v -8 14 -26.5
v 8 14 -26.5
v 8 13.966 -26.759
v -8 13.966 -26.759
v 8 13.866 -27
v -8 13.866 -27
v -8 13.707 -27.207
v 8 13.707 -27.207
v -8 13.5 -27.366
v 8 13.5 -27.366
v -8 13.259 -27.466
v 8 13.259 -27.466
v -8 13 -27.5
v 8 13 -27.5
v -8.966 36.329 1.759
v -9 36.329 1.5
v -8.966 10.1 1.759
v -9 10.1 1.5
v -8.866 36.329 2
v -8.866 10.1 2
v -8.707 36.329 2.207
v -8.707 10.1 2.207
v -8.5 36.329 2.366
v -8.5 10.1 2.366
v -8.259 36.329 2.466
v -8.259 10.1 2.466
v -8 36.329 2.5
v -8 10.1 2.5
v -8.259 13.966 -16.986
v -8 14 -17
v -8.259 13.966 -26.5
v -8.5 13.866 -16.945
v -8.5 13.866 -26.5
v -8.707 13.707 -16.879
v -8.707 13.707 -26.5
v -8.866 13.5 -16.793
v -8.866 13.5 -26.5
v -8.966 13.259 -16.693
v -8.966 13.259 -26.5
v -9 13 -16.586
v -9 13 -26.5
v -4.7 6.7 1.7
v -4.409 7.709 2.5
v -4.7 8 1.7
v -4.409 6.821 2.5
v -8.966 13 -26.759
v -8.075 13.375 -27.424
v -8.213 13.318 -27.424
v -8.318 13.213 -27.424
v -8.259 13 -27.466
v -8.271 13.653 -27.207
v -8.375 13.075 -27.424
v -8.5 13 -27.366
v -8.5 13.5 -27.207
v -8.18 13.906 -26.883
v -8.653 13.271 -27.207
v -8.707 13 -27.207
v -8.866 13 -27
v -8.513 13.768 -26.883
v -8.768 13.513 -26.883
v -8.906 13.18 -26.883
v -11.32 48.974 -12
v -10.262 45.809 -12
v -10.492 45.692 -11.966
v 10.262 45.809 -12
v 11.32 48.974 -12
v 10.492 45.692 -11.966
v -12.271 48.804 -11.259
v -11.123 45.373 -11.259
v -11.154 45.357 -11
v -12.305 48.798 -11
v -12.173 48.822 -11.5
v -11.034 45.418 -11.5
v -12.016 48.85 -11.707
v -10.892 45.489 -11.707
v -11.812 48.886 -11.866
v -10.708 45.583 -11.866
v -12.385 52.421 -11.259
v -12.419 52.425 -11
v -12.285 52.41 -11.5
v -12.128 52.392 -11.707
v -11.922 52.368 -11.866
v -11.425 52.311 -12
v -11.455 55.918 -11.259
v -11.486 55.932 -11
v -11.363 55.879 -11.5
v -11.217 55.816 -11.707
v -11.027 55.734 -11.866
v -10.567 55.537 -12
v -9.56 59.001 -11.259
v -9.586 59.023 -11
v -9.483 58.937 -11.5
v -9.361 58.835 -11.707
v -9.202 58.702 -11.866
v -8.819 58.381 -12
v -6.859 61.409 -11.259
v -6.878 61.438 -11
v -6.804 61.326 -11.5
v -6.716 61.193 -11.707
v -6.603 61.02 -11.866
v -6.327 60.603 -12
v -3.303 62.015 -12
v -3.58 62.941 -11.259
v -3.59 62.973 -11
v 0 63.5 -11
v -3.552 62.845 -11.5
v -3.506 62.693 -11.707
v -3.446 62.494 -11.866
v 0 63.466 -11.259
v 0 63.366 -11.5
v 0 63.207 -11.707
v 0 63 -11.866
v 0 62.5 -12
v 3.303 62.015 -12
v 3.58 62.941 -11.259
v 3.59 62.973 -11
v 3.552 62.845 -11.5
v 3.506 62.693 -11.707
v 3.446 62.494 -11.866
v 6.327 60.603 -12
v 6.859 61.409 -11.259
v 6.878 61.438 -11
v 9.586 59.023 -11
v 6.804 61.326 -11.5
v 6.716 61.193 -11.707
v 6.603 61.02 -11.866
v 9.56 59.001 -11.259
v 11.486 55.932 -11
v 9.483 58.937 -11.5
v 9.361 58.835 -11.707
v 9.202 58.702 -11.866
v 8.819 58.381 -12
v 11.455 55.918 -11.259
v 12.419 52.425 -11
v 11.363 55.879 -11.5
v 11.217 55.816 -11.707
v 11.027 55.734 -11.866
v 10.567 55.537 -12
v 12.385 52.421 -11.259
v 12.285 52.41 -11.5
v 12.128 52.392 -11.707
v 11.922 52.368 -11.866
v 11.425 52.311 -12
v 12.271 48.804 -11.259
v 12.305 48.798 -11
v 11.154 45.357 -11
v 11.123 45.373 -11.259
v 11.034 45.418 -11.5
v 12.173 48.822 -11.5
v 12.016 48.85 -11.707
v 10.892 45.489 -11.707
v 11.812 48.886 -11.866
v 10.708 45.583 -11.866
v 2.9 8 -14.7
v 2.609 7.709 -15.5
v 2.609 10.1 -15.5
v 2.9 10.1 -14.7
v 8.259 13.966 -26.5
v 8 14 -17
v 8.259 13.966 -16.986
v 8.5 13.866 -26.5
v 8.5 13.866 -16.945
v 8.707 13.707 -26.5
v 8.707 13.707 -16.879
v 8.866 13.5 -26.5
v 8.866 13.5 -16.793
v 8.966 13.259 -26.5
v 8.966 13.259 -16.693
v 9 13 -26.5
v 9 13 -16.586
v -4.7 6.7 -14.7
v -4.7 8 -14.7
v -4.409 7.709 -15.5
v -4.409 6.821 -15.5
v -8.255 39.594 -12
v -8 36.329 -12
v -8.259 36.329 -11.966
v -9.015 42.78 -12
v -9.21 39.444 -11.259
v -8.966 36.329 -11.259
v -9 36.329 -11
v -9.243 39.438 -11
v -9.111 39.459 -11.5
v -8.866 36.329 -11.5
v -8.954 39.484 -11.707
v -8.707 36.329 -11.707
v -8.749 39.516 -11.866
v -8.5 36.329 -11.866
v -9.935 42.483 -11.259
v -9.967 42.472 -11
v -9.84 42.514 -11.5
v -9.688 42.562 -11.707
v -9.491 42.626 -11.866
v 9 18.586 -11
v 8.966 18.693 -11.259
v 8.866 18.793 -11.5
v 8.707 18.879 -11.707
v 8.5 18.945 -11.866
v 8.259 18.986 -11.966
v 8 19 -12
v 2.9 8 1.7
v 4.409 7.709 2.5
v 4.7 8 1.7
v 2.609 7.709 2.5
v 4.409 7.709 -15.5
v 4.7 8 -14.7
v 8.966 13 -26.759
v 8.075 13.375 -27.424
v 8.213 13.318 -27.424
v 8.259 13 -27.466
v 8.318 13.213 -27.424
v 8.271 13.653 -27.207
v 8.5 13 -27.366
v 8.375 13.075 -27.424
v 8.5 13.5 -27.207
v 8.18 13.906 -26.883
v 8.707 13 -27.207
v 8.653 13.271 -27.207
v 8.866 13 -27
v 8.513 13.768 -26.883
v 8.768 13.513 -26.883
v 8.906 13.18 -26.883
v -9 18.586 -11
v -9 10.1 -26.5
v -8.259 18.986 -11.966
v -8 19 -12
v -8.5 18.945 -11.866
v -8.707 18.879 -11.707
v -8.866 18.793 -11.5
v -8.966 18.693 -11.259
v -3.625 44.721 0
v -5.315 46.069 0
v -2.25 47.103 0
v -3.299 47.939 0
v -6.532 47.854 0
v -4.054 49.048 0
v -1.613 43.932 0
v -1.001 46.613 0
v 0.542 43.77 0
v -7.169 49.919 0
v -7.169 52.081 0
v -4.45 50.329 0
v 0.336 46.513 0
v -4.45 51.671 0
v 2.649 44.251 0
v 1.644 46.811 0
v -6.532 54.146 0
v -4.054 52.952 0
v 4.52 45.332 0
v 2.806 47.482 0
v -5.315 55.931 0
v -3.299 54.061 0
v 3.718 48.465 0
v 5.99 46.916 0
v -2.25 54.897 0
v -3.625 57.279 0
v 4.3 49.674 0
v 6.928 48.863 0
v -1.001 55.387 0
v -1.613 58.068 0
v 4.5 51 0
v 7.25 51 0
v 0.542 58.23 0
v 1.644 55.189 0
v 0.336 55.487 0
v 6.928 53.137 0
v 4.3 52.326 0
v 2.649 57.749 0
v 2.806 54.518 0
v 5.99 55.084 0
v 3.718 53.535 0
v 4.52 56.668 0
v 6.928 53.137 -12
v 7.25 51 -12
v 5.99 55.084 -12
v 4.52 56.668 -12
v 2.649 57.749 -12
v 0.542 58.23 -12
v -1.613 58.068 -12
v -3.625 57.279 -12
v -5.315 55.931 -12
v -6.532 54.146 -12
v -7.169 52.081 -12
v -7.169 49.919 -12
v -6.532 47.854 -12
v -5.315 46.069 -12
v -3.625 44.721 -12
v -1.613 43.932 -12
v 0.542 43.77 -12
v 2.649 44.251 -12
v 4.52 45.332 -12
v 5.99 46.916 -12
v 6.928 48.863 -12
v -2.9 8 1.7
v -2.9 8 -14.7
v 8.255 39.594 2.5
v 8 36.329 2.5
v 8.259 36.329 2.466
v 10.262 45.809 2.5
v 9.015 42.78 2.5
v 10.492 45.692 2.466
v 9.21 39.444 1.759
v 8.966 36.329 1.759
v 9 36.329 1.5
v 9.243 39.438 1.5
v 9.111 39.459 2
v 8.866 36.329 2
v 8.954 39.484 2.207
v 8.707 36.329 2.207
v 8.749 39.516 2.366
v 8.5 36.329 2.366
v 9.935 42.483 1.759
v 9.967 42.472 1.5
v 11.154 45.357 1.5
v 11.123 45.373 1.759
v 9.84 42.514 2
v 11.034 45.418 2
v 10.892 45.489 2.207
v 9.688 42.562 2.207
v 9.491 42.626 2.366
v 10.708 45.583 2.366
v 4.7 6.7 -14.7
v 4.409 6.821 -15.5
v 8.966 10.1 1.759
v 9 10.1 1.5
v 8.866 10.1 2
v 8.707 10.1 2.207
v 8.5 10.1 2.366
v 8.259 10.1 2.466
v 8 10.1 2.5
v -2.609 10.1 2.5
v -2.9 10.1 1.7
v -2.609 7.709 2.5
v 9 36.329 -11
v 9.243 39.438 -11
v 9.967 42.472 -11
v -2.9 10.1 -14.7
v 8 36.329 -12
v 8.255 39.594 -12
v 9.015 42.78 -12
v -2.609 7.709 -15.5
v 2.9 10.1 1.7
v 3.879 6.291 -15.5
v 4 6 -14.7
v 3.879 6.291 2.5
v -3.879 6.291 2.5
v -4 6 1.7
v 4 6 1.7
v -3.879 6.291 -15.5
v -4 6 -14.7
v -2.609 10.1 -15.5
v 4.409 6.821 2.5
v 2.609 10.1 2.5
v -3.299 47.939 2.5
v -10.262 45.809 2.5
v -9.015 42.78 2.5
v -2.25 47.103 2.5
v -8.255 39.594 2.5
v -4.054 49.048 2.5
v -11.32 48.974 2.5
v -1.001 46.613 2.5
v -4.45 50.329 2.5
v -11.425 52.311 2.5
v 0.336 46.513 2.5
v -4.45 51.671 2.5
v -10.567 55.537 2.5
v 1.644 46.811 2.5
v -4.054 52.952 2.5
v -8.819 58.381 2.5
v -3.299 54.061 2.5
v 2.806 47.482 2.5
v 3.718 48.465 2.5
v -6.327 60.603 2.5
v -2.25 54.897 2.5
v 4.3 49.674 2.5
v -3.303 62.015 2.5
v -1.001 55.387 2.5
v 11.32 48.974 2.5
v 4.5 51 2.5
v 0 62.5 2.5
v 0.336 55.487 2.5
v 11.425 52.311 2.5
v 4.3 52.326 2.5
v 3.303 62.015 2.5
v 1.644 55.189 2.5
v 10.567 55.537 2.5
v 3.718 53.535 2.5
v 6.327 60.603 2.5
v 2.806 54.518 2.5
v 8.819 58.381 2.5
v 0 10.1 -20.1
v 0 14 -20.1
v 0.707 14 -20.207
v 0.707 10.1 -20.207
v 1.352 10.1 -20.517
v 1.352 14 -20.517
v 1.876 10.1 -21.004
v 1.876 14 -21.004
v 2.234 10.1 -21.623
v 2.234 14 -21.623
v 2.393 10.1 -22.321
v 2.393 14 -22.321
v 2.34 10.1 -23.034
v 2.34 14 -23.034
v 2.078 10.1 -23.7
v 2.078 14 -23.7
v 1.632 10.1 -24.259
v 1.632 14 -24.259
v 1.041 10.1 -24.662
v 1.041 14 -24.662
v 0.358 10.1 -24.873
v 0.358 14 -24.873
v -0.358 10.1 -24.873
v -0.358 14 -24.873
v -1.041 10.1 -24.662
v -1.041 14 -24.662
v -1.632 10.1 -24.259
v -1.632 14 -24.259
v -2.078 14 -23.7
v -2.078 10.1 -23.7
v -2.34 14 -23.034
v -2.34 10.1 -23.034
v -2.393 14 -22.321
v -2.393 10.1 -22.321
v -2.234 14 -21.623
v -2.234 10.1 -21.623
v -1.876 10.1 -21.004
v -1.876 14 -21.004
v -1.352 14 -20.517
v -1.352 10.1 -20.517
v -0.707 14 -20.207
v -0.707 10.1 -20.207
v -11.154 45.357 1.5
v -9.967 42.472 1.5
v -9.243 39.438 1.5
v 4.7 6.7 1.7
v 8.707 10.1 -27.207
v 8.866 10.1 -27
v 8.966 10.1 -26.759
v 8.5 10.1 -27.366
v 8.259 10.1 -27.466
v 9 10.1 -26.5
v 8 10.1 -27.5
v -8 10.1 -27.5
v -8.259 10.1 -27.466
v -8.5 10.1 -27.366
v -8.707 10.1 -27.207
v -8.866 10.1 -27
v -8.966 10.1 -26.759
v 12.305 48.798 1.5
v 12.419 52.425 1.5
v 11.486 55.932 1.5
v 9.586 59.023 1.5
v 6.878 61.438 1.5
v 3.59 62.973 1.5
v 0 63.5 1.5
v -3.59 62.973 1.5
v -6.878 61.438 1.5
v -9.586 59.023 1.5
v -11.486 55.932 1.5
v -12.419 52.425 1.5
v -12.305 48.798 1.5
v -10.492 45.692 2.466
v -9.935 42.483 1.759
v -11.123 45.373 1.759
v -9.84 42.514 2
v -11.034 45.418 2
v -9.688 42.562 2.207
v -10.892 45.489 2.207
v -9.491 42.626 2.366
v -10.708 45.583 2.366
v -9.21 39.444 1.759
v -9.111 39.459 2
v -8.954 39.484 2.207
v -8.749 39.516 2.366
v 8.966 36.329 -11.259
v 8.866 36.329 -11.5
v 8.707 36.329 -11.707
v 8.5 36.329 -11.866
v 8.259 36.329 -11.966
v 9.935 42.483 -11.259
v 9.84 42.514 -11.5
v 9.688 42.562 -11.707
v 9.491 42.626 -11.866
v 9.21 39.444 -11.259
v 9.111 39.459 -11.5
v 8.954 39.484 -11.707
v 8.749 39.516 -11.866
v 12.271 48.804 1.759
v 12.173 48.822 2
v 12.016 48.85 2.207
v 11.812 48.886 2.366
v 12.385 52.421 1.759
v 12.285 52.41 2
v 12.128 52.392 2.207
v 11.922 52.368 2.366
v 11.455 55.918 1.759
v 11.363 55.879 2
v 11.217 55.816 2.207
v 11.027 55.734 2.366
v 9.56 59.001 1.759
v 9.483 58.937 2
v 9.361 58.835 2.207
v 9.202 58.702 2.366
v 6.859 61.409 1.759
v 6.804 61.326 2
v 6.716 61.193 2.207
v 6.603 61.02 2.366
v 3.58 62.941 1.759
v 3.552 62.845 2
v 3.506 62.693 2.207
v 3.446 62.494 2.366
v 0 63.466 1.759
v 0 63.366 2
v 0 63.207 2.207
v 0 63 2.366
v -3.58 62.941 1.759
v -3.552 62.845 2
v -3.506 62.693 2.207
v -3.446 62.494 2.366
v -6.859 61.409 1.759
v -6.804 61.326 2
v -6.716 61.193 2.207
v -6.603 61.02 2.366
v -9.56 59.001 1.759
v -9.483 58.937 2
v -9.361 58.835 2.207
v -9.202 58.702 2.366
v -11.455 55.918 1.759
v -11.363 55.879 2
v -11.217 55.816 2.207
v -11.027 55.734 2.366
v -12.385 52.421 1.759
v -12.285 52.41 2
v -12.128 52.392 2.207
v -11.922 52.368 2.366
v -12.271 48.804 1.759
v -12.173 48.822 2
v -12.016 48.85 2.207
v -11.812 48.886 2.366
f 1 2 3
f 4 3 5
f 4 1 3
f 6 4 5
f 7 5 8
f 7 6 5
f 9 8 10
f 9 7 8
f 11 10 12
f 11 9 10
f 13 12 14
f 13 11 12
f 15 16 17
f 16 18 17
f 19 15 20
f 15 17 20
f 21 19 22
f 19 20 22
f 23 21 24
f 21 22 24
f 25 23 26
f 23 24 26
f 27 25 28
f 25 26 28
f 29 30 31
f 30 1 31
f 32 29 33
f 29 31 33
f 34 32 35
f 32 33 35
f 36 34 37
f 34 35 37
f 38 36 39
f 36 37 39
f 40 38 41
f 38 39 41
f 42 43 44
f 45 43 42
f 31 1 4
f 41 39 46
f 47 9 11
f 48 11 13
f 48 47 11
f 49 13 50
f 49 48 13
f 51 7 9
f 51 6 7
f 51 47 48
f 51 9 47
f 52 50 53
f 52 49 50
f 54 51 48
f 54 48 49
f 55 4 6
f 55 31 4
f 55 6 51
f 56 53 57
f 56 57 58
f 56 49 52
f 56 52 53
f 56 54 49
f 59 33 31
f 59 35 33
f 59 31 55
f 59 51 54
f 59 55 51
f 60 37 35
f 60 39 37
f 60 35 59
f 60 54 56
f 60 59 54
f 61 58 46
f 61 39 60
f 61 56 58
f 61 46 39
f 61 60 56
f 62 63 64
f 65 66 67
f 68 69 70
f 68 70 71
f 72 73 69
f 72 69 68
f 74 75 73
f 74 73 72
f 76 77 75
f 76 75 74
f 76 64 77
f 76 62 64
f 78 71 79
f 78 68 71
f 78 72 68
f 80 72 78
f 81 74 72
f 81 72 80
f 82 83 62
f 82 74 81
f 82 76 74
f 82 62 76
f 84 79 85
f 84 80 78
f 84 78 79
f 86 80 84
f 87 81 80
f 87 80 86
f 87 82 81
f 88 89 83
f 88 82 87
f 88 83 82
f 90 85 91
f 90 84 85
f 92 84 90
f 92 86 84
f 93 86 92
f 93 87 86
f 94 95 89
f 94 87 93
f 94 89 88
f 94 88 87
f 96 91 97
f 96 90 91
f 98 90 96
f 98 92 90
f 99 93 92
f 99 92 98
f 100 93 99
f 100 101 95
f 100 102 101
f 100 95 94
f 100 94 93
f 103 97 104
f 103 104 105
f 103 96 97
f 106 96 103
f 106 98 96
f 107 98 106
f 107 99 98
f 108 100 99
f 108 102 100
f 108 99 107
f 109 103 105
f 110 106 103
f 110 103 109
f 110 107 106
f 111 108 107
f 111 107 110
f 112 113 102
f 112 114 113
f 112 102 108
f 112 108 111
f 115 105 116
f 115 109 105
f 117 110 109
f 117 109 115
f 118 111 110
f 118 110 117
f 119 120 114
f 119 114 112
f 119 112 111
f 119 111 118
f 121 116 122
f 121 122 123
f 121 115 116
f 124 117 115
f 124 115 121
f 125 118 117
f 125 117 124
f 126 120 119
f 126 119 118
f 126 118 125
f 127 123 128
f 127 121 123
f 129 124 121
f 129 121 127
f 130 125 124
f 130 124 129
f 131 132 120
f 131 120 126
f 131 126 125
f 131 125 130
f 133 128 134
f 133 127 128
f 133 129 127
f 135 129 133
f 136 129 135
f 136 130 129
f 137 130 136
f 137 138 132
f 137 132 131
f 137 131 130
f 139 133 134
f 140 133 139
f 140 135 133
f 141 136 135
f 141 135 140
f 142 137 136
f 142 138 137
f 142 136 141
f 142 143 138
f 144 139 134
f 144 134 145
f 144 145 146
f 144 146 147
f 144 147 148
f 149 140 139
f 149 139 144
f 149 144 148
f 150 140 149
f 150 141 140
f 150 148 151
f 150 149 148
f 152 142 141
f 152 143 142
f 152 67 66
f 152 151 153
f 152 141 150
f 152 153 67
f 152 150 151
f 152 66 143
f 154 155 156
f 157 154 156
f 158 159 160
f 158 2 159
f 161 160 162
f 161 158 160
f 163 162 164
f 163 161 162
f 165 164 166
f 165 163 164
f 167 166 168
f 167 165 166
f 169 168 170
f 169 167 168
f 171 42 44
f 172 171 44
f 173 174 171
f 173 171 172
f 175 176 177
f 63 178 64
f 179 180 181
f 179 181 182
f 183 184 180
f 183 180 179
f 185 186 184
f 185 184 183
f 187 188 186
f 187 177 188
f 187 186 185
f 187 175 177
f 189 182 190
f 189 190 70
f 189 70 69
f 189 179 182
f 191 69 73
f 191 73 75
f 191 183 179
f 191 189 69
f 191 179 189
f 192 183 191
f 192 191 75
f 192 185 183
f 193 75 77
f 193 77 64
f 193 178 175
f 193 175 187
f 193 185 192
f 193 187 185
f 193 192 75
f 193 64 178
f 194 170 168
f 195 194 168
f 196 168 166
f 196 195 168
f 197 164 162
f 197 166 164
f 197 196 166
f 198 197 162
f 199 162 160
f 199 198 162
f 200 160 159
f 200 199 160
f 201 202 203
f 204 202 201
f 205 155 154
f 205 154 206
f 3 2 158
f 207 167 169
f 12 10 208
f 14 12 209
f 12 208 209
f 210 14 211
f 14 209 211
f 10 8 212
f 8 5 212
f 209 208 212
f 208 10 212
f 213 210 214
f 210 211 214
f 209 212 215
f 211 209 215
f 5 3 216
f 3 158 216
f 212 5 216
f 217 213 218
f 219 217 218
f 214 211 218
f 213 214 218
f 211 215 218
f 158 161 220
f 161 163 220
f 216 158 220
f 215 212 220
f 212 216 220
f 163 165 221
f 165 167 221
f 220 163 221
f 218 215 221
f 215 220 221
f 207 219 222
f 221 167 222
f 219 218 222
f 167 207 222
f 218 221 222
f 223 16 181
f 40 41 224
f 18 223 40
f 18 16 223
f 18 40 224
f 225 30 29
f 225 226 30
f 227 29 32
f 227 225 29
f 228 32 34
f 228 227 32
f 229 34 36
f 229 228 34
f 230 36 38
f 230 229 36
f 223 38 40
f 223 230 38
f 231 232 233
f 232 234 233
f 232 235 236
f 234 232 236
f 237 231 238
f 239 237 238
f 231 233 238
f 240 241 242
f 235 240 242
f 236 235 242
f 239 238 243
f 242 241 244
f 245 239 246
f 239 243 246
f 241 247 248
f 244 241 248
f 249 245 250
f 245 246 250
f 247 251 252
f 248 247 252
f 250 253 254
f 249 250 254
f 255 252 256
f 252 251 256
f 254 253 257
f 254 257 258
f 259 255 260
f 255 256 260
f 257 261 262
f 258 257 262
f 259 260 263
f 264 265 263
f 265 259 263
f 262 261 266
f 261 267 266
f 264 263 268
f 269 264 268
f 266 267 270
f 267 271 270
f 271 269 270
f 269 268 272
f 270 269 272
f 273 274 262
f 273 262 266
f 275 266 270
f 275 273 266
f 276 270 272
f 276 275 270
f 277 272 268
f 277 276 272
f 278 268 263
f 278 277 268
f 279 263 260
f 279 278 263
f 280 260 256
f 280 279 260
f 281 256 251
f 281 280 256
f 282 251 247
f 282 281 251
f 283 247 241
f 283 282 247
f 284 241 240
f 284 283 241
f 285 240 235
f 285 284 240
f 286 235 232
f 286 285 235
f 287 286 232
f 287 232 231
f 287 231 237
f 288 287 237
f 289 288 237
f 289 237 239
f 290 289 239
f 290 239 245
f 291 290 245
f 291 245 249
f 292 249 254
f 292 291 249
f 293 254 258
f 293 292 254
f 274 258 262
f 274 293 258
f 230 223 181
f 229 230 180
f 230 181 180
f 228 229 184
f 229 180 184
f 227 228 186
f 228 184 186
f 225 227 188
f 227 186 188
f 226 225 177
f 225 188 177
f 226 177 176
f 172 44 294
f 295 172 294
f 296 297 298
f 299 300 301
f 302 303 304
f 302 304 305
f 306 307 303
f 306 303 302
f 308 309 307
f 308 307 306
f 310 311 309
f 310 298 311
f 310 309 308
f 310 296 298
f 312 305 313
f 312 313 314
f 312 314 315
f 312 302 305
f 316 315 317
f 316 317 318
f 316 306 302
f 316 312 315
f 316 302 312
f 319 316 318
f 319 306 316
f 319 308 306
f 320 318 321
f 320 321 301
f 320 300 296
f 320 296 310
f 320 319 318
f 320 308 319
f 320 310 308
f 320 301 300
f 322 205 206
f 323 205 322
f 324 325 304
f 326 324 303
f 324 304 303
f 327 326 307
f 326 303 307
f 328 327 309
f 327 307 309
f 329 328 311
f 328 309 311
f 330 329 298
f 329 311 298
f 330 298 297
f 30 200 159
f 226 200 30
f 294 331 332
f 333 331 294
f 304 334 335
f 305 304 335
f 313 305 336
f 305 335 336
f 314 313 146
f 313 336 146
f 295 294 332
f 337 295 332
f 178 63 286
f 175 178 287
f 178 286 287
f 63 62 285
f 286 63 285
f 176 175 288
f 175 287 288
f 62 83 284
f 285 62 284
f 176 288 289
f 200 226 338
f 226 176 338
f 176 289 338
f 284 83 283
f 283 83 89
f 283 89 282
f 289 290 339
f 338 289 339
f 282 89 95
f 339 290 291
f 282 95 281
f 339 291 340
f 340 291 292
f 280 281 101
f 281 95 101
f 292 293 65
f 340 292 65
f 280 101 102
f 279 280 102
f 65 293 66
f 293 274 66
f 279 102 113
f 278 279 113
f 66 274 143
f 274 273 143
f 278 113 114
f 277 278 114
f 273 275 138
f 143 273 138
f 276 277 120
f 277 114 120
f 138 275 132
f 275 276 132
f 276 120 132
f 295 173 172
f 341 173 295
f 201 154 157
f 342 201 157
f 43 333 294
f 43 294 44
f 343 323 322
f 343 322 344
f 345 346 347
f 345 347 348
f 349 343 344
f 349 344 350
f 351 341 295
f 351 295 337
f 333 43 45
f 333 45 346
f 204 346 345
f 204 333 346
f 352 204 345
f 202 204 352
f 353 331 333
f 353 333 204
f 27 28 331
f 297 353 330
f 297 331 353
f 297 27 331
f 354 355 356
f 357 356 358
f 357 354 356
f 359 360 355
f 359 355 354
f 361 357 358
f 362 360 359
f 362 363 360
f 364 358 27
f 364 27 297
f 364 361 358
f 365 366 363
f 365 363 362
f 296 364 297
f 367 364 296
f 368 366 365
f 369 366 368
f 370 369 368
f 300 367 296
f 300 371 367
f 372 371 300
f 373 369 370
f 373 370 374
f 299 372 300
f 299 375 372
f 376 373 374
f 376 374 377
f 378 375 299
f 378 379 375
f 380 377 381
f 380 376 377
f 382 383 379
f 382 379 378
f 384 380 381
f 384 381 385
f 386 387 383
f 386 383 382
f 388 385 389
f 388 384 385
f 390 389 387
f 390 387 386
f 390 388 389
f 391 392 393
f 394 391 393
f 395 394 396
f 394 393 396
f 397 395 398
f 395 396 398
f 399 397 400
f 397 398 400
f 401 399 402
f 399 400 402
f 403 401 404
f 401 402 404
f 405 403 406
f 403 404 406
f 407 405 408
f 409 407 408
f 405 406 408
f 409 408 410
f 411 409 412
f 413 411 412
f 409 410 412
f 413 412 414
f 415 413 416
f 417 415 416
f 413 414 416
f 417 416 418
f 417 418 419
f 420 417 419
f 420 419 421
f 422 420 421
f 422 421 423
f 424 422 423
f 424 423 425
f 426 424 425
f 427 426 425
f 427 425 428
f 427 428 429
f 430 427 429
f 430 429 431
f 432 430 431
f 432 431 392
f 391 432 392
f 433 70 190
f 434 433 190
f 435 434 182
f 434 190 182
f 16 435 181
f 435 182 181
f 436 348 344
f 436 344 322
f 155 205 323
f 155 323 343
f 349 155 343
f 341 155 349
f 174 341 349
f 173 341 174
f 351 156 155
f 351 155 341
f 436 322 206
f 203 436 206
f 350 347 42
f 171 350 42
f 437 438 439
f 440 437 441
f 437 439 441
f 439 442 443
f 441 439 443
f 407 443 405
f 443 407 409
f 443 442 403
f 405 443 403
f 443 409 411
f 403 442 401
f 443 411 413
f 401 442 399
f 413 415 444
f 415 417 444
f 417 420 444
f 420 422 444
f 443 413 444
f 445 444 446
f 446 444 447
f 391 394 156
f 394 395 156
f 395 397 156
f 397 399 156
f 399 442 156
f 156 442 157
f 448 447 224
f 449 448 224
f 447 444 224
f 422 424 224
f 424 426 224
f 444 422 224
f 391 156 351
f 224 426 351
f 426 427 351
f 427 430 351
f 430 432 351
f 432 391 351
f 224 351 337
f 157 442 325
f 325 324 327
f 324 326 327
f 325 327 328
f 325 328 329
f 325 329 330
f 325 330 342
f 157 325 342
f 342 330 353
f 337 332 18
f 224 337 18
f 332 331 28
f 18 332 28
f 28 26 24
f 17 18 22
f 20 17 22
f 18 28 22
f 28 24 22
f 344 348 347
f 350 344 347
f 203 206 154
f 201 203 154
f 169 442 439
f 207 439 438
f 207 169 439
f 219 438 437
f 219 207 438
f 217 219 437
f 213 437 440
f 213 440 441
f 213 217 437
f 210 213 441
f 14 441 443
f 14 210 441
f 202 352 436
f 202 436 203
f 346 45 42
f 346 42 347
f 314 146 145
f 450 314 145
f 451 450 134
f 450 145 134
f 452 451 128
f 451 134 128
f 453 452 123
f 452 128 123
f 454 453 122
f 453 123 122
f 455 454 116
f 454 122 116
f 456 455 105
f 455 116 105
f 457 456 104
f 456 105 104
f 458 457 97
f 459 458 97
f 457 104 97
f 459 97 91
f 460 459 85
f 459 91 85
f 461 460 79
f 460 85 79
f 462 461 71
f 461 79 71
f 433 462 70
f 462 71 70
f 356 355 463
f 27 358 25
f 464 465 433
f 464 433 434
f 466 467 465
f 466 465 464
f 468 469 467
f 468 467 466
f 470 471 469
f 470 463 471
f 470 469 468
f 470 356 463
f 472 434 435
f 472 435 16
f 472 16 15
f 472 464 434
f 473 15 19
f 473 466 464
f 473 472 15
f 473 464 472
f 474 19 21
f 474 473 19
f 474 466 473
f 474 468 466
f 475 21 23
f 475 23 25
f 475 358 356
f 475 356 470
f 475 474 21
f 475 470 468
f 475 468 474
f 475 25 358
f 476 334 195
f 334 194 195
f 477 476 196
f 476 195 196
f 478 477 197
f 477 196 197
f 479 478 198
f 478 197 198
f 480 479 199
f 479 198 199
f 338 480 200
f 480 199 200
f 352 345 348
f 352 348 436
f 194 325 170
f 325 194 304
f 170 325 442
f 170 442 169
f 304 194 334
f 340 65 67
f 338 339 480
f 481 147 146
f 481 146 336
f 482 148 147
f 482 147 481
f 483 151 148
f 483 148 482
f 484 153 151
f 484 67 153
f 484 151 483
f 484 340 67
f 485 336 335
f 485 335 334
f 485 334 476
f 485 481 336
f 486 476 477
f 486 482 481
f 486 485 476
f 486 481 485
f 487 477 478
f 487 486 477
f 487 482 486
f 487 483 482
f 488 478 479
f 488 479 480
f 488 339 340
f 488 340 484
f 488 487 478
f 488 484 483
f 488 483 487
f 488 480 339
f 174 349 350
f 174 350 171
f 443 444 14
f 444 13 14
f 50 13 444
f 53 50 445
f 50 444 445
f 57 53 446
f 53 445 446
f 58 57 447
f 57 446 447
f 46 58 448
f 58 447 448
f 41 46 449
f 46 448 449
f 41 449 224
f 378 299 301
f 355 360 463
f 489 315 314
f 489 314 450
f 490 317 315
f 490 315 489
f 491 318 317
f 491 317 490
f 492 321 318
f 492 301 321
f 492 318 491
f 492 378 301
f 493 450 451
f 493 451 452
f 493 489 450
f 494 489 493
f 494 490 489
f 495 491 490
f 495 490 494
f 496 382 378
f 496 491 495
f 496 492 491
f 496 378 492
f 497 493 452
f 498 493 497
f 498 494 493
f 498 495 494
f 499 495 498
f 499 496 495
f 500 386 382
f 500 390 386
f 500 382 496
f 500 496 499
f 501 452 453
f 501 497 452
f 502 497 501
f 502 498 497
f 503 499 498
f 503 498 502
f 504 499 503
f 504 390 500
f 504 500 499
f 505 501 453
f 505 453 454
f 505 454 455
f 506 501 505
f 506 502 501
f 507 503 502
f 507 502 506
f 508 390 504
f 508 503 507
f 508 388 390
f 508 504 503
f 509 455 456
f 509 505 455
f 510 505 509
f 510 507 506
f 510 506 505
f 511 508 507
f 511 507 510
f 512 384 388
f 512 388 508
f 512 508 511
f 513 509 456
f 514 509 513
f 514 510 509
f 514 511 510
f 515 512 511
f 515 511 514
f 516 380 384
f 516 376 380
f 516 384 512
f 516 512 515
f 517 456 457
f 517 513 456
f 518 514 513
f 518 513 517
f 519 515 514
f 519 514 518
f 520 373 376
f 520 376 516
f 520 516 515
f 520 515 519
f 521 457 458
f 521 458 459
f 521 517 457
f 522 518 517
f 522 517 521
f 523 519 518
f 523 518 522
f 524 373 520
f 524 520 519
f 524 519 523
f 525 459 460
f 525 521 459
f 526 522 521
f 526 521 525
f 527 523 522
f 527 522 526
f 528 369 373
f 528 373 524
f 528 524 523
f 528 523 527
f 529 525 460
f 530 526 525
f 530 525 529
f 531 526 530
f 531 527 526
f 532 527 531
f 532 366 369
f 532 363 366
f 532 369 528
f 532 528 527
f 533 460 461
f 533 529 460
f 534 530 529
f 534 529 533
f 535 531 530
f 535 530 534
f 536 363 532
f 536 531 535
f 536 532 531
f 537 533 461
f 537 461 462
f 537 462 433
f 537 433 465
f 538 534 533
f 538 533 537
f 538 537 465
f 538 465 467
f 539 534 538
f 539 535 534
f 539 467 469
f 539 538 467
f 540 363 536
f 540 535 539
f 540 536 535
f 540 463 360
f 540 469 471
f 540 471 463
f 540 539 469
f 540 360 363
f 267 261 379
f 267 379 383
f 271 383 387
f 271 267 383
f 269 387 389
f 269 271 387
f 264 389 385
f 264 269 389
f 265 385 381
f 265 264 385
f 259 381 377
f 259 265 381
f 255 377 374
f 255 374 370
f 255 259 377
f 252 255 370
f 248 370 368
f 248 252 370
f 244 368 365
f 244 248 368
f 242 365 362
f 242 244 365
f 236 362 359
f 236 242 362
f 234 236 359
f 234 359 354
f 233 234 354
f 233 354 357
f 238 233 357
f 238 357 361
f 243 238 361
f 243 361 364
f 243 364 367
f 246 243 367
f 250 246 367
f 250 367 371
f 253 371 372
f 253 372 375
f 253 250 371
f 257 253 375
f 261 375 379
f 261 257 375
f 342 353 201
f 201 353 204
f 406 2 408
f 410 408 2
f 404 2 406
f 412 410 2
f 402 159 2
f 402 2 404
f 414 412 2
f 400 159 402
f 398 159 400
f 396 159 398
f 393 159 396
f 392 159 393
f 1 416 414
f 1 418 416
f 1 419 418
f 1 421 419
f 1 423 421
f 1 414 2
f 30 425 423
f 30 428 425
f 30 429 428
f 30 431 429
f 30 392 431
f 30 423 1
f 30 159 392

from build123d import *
from OCP.BRepFilletAPI import BRepFilletAPI_MakeChamfer

# Parameters (mm, degrees)
SKETCH_1_R          = 4.5
EXTRUDE_1_DEPTH     = 2.5
EXTRUDE_START       = -12
SKETCH_1_13_R       = 7.25
SKETCH_1_13_R_2     = 4.5
EXTRUDE_5_DEPTH     = 12
EXTRUDE_START_2     = -7.5
EXTRUDE_2_DEPTH     = 20
EXTRUDE_3_DEPTH     = 15.5
SKETCH_4_R          = 2.4
CUT_EXTRUDE_3_DEPTH = 58.989223137
CUT_EXTRUDE_5_DEPTH = 0.1
CHAMFER_3_SIZE      = 0.8
CHAMFER_3_SIZE2     = 0.291176187
CHAMFER_4_SIZE      = 5
FILLET_1_R          = 1


with BuildPart() as part:
    # 草图1 → 凸台-拉伸1 (new body)
    with BuildSketch(Plane.XY):
        with BuildLine():
            Line((2.9, 10), (9, 10))
            Line((9, 10), (9, 36.328599249))
            ThreePointArc((9, 36.328599249), (9.545912037, 40.969554058), (11.153846154, 45.357153557))
            ThreePointArc((11.153846154, 45.357153557), (0, 63.5), (-11.153846154, 45.357153557))
            ThreePointArc((-11.153846154, 45.357153557), (-9.545912037, 40.969554058), (-9, 36.328599249))
            Line((-9, 36.328599249), (-9, 10))
            Line((-9, 10), (-2.9, 10))
            Line((-2.9, 10), (-2.9, 8))
            Line((-2.9, 8), (-4.7, 8))
            Line((-4.7, 8), (-4.7, 6.7))
            Line((-4.7, 6.7), (-4, 6))
            Line((-4, 6), (4, 6))
            Line((4, 6), (4.7, 6.7))
            Line((4.7, 6.7), (4.7, 8))
            Line((4.7, 8), (2.9, 8))
            Line((2.9, 8), (2.9, 10))
        make_face()
        with Locations((0, 51)):
            Circle(SKETCH_1_R, mode=Mode.SUBTRACT)
    extrude(amount=EXTRUDE_1_DEPTH)

    # 草图1<13> → 凸台-拉伸5 (add)
    # profile 1 of 4: a face of its own
    with BuildSketch(Plane.XY.offset(EXTRUDE_START)):
        Polygon((2.9, 10), (9, 10), (9, 14), (-9, 14), (-9, 10), (-2.9, 10), align=None)
    # profile 2 of 4: a face of its own
    with BuildSketch(Plane.XY.offset(EXTRUDE_START)):
        Polygon((2.9, 8), (2.9, 10), (-2.9, 10), (-2.9, 8), (-4.7, 8), (-4.7, 6.7), (-4, 6), (4, 6), (4.7, 6.7), (4.7, 8), align=None)
    # profile 3 of 4: a face of its own
    with BuildSketch(Plane.XY.offset(EXTRUDE_START)):
        with BuildLine():
            Line((-9, 14), (9, 14))
            Line((9, 14), (9, 36.328599249))
            ThreePointArc((9, 36.328599249), (9.545912037, 40.969554058), (11.153846154, 45.357153557))
            ThreePointArc((11.153846154, 45.357153557), (0, 63.5), (-11.153846154, 45.357153557))
            ThreePointArc((-11.153846154, 45.357153557), (-9.545912037, 40.969554058), (-9, 36.328599249))
            Line((-9, 36.328599249), (-9, 14))
        make_face()
        with Locations((0, 51)):
            Circle(SKETCH_1_13_R, mode=Mode.SUBTRACT)
    # profile 4 of 4: a face of its own
    with BuildSketch(Plane.XY.offset(EXTRUDE_START)):
        with Locations((0, 51)):
            Circle(SKETCH_1_13_R_2)
    extrude(amount=EXTRUDE_5_DEPTH)


with BuildPart() as extrude_5_kept_piece:
    # of the separate pieces the step leaves, the one the design keeps (extrude_5_pieces_kept)
    add(part.part.solids().sort_by_distance((2.9, 10, 2.5))[0])

    # 草图1<10> → 凸台-拉伸2 (add)
    with BuildSketch(Plane.XY.offset(EXTRUDE_START_2)):
        Polygon((2.9, 10), (9, 10), (9, 14), (-9, 14), (-9, 10), (-2.9, 10), align=None)
    extrude(amount=-EXTRUDE_2_DEPTH)

    # 草图1<11> → 凸台-拉伸3 (add)
    with BuildSketch(Plane.XY):
        Polygon((2.9, 8), (4.7, 8), (4.7, 6.7), (4, 6), (-4, 6), (-4.7, 6.7), (-4.7, 8), (-2.9, 8), (-2.9, 10), (2.9, 10), align=None)
    extrude(amount=-EXTRUDE_3_DEPTH)

    # 草图4 → 切除-拉伸3 (cut, through all)
    with BuildSketch(Plane(origin=(0, 14, 0), x_dir=(1, 0, 0), z_dir=(0, 1, 0))):
        with Locations(Location((0, 22.5, 0), (0, 0, 270))):
            Circle(SKETCH_4_R)
    extrude(amount=-CUT_EXTRUDE_3_DEPTH, mode=Mode.SUBTRACT)

    # 草图7 → 切除-拉伸5 (cut)
    with BuildSketch(Plane.XZ.offset(-10)):
        Polygon((2.9, 2.5), (9, 2.5), (9, -27.5), (-9, -27.5), (-9, 2.5), (-2.9, 2.5), (-2.9, -15.5), (2.9, -15.5), align=None)
    extrude(amount=-CUT_EXTRUDE_5_DEPTH, mode=Mode.SUBTRACT)

    # 倒角3: one chamfer whose edges measure the first distance from different faces: ONE call of the kernel's chamfer builder (chamfer() names one face for all edges)
    chamfer_3_edges_1 = [extrude_5_kept_piece.edges().sort_by_distance(p)[0] for p in [
        (2.9, 9.05, -15.5),
        (2.9, 9.05, 2.5),
    ]]
    chamfer_3_side_1 = [extrude_5_kept_piece.faces().sort_by_distance(p)[0] for p in [
        (2.9, 9.05, -6.5),
    ]]
    chamfer_3_edges_2 = [extrude_5_kept_piece.edges().sort_by_distance(p)[0] for p in [
        (4.7, 7.35, -15.5),
        (4.7, 7.35, 2.5),
    ]]
    chamfer_3_side_2 = [extrude_5_kept_piece.faces().sort_by_distance(p)[0] for p in [
        (4.7, 7.35, -6.5),
    ]]
    chamfer_3_edges_3 = [extrude_5_kept_piece.edges().sort_by_distance(p)[0] for p in [
        (4.35, 6.35, -15.5),
        (4.35, 6.35, 2.5),
    ]]
    chamfer_3_side_3 = [extrude_5_kept_piece.faces().sort_by_distance(p)[0] for p in [
        (4.35, 6.35, -6.5),
    ]]
    chamfer_3_edges_4 = [extrude_5_kept_piece.edges().sort_by_distance(p)[0] for p in [
        (3.8, 8, -15.5),
        (3.8, 8, 2.5),
    ]]
    chamfer_3_side_4 = [extrude_5_kept_piece.faces().sort_by_distance(p)[0] for p in [
        (3.8, 8, -6.5),
    ]]
    chamfer_3_edges_5 = [extrude_5_kept_piece.edges().sort_by_distance(p)[0] for p in [
        (0, 6, -15.5),
        (0, 6, 2.5),
    ]]
    chamfer_3_side_5 = [extrude_5_kept_piece.faces().sort_by_distance(p)[0] for p in [
        (0, 6, -6.5),
    ]]
    chamfer_3_edges_6 = [extrude_5_kept_piece.edges().sort_by_distance(p)[0] for p in [
        (-4.35, 6.35, -15.5),
        (-4.35, 6.35, 2.5),
    ]]
    chamfer_3_side_6 = [extrude_5_kept_piece.faces().sort_by_distance(p)[0] for p in [
        (-4.35, 6.35, -6.5),
    ]]
    chamfer_3_edges_7 = [extrude_5_kept_piece.edges().sort_by_distance(p)[0] for p in [
        (-4.7, 7.35, -15.5),
        (-4.7, 7.35, 2.5),
    ]]
    chamfer_3_side_7 = [extrude_5_kept_piece.faces().sort_by_distance(p)[0] for p in [
        (-4.7, 7.35, -6.5),
    ]]
    chamfer_3_edges_8 = [extrude_5_kept_piece.edges().sort_by_distance(p)[0] for p in [
        (-3.8, 8, -15.5),
        (-3.8, 8, 2.5),
    ]]
    chamfer_3_side_8 = [extrude_5_kept_piece.faces().sort_by_distance(p)[0] for p in [
        (-3.8, 8, -6.5),
    ]]
    chamfer_3_edges_9 = [extrude_5_kept_piece.edges().sort_by_distance(p)[0] for p in [
        (-2.9, 9.05, -15.5),
        (-2.9, 9.05, 2.5),
    ]]
    chamfer_3_side_9 = [extrude_5_kept_piece.faces().sort_by_distance(p)[0] for p in [
        (-2.9, 9.05, -6.5),
    ]]
    chamfer_3 = BRepFilletAPI_MakeChamfer(extrude_5_kept_piece.part.solid().wrapped)
    for e in chamfer_3_edges_1:
        chamfer_3.Add(CHAMFER_3_SIZE, CHAMFER_3_SIZE2, e.wrapped, chamfer_3_side_1[0].wrapped)  # the first distance lies on this face
    for e in chamfer_3_edges_2:
        chamfer_3.Add(CHAMFER_3_SIZE, CHAMFER_3_SIZE2, e.wrapped, chamfer_3_side_2[0].wrapped)  # the first distance lies on this face
    for e in chamfer_3_edges_3:
        chamfer_3.Add(CHAMFER_3_SIZE, CHAMFER_3_SIZE2, e.wrapped, chamfer_3_side_3[0].wrapped)  # the first distance lies on this face
    for e in chamfer_3_edges_4:
        chamfer_3.Add(CHAMFER_3_SIZE, CHAMFER_3_SIZE2, e.wrapped, chamfer_3_side_4[0].wrapped)  # the first distance lies on this face
    for e in chamfer_3_edges_5:
        chamfer_3.Add(CHAMFER_3_SIZE, CHAMFER_3_SIZE2, e.wrapped, chamfer_3_side_5[0].wrapped)  # the first distance lies on this face
    for e in chamfer_3_edges_6:
        chamfer_3.Add(CHAMFER_3_SIZE, CHAMFER_3_SIZE2, e.wrapped, chamfer_3_side_6[0].wrapped)  # the first distance lies on this face
    for e in chamfer_3_edges_7:
        chamfer_3.Add(CHAMFER_3_SIZE, CHAMFER_3_SIZE2, e.wrapped, chamfer_3_side_7[0].wrapped)  # the first distance lies on this face
    for e in chamfer_3_edges_8:
        chamfer_3.Add(CHAMFER_3_SIZE, CHAMFER_3_SIZE2, e.wrapped, chamfer_3_side_8[0].wrapped)  # the first distance lies on this face
    for e in chamfer_3_edges_9:
        chamfer_3.Add(CHAMFER_3_SIZE, CHAMFER_3_SIZE2, e.wrapped, chamfer_3_side_9[0].wrapped)  # the first distance lies on this face
    add(Compound.cast(chamfer_3.Shape()), mode=Mode.REPLACE)

    # 倒角4
    chamfer_4_edges = [extrude_5_kept_piece.edges().sort_by_distance(p)[0] for p in [
        (0, 14, -12),
    ]]
    chamfer(chamfer_4_edges, length=CHAMFER_4_SIZE)

    # 圆角1
    fillet_1_edges = [extrude_5_kept_piece.edges().sort_by_distance(p)[0] for p in [
        (-9, 14, -22.25),
        (9, 14, -22.25),
        (0, 14, -27.5),
        (-9, 12.05, -27.5),
        (9, 12.05, -27.5),
        (9, 23.214299624, 2.5),
        (-9, 23.214299624, 2.5),
        (9.545912037, 40.969554058, 2.5),
        (0, 63.5, 2.5),
        (-9, 27.664299624, -12),
        (9, 27.664299624, -12),
        (9, 16.5, -14.5),
        (-9, 16.5, -14.5),
        (-9.545912037, 40.969554058, 2.5),
        (0, 63.5, -12),
        (9.545912037, 40.969554058, -12),
        (-9.545912037, 40.969554058, -12),
    ]]
    fillet(fillet_1_edges, radius=FILLET_1_R)


solid = extrude_5_kept_piece.part
